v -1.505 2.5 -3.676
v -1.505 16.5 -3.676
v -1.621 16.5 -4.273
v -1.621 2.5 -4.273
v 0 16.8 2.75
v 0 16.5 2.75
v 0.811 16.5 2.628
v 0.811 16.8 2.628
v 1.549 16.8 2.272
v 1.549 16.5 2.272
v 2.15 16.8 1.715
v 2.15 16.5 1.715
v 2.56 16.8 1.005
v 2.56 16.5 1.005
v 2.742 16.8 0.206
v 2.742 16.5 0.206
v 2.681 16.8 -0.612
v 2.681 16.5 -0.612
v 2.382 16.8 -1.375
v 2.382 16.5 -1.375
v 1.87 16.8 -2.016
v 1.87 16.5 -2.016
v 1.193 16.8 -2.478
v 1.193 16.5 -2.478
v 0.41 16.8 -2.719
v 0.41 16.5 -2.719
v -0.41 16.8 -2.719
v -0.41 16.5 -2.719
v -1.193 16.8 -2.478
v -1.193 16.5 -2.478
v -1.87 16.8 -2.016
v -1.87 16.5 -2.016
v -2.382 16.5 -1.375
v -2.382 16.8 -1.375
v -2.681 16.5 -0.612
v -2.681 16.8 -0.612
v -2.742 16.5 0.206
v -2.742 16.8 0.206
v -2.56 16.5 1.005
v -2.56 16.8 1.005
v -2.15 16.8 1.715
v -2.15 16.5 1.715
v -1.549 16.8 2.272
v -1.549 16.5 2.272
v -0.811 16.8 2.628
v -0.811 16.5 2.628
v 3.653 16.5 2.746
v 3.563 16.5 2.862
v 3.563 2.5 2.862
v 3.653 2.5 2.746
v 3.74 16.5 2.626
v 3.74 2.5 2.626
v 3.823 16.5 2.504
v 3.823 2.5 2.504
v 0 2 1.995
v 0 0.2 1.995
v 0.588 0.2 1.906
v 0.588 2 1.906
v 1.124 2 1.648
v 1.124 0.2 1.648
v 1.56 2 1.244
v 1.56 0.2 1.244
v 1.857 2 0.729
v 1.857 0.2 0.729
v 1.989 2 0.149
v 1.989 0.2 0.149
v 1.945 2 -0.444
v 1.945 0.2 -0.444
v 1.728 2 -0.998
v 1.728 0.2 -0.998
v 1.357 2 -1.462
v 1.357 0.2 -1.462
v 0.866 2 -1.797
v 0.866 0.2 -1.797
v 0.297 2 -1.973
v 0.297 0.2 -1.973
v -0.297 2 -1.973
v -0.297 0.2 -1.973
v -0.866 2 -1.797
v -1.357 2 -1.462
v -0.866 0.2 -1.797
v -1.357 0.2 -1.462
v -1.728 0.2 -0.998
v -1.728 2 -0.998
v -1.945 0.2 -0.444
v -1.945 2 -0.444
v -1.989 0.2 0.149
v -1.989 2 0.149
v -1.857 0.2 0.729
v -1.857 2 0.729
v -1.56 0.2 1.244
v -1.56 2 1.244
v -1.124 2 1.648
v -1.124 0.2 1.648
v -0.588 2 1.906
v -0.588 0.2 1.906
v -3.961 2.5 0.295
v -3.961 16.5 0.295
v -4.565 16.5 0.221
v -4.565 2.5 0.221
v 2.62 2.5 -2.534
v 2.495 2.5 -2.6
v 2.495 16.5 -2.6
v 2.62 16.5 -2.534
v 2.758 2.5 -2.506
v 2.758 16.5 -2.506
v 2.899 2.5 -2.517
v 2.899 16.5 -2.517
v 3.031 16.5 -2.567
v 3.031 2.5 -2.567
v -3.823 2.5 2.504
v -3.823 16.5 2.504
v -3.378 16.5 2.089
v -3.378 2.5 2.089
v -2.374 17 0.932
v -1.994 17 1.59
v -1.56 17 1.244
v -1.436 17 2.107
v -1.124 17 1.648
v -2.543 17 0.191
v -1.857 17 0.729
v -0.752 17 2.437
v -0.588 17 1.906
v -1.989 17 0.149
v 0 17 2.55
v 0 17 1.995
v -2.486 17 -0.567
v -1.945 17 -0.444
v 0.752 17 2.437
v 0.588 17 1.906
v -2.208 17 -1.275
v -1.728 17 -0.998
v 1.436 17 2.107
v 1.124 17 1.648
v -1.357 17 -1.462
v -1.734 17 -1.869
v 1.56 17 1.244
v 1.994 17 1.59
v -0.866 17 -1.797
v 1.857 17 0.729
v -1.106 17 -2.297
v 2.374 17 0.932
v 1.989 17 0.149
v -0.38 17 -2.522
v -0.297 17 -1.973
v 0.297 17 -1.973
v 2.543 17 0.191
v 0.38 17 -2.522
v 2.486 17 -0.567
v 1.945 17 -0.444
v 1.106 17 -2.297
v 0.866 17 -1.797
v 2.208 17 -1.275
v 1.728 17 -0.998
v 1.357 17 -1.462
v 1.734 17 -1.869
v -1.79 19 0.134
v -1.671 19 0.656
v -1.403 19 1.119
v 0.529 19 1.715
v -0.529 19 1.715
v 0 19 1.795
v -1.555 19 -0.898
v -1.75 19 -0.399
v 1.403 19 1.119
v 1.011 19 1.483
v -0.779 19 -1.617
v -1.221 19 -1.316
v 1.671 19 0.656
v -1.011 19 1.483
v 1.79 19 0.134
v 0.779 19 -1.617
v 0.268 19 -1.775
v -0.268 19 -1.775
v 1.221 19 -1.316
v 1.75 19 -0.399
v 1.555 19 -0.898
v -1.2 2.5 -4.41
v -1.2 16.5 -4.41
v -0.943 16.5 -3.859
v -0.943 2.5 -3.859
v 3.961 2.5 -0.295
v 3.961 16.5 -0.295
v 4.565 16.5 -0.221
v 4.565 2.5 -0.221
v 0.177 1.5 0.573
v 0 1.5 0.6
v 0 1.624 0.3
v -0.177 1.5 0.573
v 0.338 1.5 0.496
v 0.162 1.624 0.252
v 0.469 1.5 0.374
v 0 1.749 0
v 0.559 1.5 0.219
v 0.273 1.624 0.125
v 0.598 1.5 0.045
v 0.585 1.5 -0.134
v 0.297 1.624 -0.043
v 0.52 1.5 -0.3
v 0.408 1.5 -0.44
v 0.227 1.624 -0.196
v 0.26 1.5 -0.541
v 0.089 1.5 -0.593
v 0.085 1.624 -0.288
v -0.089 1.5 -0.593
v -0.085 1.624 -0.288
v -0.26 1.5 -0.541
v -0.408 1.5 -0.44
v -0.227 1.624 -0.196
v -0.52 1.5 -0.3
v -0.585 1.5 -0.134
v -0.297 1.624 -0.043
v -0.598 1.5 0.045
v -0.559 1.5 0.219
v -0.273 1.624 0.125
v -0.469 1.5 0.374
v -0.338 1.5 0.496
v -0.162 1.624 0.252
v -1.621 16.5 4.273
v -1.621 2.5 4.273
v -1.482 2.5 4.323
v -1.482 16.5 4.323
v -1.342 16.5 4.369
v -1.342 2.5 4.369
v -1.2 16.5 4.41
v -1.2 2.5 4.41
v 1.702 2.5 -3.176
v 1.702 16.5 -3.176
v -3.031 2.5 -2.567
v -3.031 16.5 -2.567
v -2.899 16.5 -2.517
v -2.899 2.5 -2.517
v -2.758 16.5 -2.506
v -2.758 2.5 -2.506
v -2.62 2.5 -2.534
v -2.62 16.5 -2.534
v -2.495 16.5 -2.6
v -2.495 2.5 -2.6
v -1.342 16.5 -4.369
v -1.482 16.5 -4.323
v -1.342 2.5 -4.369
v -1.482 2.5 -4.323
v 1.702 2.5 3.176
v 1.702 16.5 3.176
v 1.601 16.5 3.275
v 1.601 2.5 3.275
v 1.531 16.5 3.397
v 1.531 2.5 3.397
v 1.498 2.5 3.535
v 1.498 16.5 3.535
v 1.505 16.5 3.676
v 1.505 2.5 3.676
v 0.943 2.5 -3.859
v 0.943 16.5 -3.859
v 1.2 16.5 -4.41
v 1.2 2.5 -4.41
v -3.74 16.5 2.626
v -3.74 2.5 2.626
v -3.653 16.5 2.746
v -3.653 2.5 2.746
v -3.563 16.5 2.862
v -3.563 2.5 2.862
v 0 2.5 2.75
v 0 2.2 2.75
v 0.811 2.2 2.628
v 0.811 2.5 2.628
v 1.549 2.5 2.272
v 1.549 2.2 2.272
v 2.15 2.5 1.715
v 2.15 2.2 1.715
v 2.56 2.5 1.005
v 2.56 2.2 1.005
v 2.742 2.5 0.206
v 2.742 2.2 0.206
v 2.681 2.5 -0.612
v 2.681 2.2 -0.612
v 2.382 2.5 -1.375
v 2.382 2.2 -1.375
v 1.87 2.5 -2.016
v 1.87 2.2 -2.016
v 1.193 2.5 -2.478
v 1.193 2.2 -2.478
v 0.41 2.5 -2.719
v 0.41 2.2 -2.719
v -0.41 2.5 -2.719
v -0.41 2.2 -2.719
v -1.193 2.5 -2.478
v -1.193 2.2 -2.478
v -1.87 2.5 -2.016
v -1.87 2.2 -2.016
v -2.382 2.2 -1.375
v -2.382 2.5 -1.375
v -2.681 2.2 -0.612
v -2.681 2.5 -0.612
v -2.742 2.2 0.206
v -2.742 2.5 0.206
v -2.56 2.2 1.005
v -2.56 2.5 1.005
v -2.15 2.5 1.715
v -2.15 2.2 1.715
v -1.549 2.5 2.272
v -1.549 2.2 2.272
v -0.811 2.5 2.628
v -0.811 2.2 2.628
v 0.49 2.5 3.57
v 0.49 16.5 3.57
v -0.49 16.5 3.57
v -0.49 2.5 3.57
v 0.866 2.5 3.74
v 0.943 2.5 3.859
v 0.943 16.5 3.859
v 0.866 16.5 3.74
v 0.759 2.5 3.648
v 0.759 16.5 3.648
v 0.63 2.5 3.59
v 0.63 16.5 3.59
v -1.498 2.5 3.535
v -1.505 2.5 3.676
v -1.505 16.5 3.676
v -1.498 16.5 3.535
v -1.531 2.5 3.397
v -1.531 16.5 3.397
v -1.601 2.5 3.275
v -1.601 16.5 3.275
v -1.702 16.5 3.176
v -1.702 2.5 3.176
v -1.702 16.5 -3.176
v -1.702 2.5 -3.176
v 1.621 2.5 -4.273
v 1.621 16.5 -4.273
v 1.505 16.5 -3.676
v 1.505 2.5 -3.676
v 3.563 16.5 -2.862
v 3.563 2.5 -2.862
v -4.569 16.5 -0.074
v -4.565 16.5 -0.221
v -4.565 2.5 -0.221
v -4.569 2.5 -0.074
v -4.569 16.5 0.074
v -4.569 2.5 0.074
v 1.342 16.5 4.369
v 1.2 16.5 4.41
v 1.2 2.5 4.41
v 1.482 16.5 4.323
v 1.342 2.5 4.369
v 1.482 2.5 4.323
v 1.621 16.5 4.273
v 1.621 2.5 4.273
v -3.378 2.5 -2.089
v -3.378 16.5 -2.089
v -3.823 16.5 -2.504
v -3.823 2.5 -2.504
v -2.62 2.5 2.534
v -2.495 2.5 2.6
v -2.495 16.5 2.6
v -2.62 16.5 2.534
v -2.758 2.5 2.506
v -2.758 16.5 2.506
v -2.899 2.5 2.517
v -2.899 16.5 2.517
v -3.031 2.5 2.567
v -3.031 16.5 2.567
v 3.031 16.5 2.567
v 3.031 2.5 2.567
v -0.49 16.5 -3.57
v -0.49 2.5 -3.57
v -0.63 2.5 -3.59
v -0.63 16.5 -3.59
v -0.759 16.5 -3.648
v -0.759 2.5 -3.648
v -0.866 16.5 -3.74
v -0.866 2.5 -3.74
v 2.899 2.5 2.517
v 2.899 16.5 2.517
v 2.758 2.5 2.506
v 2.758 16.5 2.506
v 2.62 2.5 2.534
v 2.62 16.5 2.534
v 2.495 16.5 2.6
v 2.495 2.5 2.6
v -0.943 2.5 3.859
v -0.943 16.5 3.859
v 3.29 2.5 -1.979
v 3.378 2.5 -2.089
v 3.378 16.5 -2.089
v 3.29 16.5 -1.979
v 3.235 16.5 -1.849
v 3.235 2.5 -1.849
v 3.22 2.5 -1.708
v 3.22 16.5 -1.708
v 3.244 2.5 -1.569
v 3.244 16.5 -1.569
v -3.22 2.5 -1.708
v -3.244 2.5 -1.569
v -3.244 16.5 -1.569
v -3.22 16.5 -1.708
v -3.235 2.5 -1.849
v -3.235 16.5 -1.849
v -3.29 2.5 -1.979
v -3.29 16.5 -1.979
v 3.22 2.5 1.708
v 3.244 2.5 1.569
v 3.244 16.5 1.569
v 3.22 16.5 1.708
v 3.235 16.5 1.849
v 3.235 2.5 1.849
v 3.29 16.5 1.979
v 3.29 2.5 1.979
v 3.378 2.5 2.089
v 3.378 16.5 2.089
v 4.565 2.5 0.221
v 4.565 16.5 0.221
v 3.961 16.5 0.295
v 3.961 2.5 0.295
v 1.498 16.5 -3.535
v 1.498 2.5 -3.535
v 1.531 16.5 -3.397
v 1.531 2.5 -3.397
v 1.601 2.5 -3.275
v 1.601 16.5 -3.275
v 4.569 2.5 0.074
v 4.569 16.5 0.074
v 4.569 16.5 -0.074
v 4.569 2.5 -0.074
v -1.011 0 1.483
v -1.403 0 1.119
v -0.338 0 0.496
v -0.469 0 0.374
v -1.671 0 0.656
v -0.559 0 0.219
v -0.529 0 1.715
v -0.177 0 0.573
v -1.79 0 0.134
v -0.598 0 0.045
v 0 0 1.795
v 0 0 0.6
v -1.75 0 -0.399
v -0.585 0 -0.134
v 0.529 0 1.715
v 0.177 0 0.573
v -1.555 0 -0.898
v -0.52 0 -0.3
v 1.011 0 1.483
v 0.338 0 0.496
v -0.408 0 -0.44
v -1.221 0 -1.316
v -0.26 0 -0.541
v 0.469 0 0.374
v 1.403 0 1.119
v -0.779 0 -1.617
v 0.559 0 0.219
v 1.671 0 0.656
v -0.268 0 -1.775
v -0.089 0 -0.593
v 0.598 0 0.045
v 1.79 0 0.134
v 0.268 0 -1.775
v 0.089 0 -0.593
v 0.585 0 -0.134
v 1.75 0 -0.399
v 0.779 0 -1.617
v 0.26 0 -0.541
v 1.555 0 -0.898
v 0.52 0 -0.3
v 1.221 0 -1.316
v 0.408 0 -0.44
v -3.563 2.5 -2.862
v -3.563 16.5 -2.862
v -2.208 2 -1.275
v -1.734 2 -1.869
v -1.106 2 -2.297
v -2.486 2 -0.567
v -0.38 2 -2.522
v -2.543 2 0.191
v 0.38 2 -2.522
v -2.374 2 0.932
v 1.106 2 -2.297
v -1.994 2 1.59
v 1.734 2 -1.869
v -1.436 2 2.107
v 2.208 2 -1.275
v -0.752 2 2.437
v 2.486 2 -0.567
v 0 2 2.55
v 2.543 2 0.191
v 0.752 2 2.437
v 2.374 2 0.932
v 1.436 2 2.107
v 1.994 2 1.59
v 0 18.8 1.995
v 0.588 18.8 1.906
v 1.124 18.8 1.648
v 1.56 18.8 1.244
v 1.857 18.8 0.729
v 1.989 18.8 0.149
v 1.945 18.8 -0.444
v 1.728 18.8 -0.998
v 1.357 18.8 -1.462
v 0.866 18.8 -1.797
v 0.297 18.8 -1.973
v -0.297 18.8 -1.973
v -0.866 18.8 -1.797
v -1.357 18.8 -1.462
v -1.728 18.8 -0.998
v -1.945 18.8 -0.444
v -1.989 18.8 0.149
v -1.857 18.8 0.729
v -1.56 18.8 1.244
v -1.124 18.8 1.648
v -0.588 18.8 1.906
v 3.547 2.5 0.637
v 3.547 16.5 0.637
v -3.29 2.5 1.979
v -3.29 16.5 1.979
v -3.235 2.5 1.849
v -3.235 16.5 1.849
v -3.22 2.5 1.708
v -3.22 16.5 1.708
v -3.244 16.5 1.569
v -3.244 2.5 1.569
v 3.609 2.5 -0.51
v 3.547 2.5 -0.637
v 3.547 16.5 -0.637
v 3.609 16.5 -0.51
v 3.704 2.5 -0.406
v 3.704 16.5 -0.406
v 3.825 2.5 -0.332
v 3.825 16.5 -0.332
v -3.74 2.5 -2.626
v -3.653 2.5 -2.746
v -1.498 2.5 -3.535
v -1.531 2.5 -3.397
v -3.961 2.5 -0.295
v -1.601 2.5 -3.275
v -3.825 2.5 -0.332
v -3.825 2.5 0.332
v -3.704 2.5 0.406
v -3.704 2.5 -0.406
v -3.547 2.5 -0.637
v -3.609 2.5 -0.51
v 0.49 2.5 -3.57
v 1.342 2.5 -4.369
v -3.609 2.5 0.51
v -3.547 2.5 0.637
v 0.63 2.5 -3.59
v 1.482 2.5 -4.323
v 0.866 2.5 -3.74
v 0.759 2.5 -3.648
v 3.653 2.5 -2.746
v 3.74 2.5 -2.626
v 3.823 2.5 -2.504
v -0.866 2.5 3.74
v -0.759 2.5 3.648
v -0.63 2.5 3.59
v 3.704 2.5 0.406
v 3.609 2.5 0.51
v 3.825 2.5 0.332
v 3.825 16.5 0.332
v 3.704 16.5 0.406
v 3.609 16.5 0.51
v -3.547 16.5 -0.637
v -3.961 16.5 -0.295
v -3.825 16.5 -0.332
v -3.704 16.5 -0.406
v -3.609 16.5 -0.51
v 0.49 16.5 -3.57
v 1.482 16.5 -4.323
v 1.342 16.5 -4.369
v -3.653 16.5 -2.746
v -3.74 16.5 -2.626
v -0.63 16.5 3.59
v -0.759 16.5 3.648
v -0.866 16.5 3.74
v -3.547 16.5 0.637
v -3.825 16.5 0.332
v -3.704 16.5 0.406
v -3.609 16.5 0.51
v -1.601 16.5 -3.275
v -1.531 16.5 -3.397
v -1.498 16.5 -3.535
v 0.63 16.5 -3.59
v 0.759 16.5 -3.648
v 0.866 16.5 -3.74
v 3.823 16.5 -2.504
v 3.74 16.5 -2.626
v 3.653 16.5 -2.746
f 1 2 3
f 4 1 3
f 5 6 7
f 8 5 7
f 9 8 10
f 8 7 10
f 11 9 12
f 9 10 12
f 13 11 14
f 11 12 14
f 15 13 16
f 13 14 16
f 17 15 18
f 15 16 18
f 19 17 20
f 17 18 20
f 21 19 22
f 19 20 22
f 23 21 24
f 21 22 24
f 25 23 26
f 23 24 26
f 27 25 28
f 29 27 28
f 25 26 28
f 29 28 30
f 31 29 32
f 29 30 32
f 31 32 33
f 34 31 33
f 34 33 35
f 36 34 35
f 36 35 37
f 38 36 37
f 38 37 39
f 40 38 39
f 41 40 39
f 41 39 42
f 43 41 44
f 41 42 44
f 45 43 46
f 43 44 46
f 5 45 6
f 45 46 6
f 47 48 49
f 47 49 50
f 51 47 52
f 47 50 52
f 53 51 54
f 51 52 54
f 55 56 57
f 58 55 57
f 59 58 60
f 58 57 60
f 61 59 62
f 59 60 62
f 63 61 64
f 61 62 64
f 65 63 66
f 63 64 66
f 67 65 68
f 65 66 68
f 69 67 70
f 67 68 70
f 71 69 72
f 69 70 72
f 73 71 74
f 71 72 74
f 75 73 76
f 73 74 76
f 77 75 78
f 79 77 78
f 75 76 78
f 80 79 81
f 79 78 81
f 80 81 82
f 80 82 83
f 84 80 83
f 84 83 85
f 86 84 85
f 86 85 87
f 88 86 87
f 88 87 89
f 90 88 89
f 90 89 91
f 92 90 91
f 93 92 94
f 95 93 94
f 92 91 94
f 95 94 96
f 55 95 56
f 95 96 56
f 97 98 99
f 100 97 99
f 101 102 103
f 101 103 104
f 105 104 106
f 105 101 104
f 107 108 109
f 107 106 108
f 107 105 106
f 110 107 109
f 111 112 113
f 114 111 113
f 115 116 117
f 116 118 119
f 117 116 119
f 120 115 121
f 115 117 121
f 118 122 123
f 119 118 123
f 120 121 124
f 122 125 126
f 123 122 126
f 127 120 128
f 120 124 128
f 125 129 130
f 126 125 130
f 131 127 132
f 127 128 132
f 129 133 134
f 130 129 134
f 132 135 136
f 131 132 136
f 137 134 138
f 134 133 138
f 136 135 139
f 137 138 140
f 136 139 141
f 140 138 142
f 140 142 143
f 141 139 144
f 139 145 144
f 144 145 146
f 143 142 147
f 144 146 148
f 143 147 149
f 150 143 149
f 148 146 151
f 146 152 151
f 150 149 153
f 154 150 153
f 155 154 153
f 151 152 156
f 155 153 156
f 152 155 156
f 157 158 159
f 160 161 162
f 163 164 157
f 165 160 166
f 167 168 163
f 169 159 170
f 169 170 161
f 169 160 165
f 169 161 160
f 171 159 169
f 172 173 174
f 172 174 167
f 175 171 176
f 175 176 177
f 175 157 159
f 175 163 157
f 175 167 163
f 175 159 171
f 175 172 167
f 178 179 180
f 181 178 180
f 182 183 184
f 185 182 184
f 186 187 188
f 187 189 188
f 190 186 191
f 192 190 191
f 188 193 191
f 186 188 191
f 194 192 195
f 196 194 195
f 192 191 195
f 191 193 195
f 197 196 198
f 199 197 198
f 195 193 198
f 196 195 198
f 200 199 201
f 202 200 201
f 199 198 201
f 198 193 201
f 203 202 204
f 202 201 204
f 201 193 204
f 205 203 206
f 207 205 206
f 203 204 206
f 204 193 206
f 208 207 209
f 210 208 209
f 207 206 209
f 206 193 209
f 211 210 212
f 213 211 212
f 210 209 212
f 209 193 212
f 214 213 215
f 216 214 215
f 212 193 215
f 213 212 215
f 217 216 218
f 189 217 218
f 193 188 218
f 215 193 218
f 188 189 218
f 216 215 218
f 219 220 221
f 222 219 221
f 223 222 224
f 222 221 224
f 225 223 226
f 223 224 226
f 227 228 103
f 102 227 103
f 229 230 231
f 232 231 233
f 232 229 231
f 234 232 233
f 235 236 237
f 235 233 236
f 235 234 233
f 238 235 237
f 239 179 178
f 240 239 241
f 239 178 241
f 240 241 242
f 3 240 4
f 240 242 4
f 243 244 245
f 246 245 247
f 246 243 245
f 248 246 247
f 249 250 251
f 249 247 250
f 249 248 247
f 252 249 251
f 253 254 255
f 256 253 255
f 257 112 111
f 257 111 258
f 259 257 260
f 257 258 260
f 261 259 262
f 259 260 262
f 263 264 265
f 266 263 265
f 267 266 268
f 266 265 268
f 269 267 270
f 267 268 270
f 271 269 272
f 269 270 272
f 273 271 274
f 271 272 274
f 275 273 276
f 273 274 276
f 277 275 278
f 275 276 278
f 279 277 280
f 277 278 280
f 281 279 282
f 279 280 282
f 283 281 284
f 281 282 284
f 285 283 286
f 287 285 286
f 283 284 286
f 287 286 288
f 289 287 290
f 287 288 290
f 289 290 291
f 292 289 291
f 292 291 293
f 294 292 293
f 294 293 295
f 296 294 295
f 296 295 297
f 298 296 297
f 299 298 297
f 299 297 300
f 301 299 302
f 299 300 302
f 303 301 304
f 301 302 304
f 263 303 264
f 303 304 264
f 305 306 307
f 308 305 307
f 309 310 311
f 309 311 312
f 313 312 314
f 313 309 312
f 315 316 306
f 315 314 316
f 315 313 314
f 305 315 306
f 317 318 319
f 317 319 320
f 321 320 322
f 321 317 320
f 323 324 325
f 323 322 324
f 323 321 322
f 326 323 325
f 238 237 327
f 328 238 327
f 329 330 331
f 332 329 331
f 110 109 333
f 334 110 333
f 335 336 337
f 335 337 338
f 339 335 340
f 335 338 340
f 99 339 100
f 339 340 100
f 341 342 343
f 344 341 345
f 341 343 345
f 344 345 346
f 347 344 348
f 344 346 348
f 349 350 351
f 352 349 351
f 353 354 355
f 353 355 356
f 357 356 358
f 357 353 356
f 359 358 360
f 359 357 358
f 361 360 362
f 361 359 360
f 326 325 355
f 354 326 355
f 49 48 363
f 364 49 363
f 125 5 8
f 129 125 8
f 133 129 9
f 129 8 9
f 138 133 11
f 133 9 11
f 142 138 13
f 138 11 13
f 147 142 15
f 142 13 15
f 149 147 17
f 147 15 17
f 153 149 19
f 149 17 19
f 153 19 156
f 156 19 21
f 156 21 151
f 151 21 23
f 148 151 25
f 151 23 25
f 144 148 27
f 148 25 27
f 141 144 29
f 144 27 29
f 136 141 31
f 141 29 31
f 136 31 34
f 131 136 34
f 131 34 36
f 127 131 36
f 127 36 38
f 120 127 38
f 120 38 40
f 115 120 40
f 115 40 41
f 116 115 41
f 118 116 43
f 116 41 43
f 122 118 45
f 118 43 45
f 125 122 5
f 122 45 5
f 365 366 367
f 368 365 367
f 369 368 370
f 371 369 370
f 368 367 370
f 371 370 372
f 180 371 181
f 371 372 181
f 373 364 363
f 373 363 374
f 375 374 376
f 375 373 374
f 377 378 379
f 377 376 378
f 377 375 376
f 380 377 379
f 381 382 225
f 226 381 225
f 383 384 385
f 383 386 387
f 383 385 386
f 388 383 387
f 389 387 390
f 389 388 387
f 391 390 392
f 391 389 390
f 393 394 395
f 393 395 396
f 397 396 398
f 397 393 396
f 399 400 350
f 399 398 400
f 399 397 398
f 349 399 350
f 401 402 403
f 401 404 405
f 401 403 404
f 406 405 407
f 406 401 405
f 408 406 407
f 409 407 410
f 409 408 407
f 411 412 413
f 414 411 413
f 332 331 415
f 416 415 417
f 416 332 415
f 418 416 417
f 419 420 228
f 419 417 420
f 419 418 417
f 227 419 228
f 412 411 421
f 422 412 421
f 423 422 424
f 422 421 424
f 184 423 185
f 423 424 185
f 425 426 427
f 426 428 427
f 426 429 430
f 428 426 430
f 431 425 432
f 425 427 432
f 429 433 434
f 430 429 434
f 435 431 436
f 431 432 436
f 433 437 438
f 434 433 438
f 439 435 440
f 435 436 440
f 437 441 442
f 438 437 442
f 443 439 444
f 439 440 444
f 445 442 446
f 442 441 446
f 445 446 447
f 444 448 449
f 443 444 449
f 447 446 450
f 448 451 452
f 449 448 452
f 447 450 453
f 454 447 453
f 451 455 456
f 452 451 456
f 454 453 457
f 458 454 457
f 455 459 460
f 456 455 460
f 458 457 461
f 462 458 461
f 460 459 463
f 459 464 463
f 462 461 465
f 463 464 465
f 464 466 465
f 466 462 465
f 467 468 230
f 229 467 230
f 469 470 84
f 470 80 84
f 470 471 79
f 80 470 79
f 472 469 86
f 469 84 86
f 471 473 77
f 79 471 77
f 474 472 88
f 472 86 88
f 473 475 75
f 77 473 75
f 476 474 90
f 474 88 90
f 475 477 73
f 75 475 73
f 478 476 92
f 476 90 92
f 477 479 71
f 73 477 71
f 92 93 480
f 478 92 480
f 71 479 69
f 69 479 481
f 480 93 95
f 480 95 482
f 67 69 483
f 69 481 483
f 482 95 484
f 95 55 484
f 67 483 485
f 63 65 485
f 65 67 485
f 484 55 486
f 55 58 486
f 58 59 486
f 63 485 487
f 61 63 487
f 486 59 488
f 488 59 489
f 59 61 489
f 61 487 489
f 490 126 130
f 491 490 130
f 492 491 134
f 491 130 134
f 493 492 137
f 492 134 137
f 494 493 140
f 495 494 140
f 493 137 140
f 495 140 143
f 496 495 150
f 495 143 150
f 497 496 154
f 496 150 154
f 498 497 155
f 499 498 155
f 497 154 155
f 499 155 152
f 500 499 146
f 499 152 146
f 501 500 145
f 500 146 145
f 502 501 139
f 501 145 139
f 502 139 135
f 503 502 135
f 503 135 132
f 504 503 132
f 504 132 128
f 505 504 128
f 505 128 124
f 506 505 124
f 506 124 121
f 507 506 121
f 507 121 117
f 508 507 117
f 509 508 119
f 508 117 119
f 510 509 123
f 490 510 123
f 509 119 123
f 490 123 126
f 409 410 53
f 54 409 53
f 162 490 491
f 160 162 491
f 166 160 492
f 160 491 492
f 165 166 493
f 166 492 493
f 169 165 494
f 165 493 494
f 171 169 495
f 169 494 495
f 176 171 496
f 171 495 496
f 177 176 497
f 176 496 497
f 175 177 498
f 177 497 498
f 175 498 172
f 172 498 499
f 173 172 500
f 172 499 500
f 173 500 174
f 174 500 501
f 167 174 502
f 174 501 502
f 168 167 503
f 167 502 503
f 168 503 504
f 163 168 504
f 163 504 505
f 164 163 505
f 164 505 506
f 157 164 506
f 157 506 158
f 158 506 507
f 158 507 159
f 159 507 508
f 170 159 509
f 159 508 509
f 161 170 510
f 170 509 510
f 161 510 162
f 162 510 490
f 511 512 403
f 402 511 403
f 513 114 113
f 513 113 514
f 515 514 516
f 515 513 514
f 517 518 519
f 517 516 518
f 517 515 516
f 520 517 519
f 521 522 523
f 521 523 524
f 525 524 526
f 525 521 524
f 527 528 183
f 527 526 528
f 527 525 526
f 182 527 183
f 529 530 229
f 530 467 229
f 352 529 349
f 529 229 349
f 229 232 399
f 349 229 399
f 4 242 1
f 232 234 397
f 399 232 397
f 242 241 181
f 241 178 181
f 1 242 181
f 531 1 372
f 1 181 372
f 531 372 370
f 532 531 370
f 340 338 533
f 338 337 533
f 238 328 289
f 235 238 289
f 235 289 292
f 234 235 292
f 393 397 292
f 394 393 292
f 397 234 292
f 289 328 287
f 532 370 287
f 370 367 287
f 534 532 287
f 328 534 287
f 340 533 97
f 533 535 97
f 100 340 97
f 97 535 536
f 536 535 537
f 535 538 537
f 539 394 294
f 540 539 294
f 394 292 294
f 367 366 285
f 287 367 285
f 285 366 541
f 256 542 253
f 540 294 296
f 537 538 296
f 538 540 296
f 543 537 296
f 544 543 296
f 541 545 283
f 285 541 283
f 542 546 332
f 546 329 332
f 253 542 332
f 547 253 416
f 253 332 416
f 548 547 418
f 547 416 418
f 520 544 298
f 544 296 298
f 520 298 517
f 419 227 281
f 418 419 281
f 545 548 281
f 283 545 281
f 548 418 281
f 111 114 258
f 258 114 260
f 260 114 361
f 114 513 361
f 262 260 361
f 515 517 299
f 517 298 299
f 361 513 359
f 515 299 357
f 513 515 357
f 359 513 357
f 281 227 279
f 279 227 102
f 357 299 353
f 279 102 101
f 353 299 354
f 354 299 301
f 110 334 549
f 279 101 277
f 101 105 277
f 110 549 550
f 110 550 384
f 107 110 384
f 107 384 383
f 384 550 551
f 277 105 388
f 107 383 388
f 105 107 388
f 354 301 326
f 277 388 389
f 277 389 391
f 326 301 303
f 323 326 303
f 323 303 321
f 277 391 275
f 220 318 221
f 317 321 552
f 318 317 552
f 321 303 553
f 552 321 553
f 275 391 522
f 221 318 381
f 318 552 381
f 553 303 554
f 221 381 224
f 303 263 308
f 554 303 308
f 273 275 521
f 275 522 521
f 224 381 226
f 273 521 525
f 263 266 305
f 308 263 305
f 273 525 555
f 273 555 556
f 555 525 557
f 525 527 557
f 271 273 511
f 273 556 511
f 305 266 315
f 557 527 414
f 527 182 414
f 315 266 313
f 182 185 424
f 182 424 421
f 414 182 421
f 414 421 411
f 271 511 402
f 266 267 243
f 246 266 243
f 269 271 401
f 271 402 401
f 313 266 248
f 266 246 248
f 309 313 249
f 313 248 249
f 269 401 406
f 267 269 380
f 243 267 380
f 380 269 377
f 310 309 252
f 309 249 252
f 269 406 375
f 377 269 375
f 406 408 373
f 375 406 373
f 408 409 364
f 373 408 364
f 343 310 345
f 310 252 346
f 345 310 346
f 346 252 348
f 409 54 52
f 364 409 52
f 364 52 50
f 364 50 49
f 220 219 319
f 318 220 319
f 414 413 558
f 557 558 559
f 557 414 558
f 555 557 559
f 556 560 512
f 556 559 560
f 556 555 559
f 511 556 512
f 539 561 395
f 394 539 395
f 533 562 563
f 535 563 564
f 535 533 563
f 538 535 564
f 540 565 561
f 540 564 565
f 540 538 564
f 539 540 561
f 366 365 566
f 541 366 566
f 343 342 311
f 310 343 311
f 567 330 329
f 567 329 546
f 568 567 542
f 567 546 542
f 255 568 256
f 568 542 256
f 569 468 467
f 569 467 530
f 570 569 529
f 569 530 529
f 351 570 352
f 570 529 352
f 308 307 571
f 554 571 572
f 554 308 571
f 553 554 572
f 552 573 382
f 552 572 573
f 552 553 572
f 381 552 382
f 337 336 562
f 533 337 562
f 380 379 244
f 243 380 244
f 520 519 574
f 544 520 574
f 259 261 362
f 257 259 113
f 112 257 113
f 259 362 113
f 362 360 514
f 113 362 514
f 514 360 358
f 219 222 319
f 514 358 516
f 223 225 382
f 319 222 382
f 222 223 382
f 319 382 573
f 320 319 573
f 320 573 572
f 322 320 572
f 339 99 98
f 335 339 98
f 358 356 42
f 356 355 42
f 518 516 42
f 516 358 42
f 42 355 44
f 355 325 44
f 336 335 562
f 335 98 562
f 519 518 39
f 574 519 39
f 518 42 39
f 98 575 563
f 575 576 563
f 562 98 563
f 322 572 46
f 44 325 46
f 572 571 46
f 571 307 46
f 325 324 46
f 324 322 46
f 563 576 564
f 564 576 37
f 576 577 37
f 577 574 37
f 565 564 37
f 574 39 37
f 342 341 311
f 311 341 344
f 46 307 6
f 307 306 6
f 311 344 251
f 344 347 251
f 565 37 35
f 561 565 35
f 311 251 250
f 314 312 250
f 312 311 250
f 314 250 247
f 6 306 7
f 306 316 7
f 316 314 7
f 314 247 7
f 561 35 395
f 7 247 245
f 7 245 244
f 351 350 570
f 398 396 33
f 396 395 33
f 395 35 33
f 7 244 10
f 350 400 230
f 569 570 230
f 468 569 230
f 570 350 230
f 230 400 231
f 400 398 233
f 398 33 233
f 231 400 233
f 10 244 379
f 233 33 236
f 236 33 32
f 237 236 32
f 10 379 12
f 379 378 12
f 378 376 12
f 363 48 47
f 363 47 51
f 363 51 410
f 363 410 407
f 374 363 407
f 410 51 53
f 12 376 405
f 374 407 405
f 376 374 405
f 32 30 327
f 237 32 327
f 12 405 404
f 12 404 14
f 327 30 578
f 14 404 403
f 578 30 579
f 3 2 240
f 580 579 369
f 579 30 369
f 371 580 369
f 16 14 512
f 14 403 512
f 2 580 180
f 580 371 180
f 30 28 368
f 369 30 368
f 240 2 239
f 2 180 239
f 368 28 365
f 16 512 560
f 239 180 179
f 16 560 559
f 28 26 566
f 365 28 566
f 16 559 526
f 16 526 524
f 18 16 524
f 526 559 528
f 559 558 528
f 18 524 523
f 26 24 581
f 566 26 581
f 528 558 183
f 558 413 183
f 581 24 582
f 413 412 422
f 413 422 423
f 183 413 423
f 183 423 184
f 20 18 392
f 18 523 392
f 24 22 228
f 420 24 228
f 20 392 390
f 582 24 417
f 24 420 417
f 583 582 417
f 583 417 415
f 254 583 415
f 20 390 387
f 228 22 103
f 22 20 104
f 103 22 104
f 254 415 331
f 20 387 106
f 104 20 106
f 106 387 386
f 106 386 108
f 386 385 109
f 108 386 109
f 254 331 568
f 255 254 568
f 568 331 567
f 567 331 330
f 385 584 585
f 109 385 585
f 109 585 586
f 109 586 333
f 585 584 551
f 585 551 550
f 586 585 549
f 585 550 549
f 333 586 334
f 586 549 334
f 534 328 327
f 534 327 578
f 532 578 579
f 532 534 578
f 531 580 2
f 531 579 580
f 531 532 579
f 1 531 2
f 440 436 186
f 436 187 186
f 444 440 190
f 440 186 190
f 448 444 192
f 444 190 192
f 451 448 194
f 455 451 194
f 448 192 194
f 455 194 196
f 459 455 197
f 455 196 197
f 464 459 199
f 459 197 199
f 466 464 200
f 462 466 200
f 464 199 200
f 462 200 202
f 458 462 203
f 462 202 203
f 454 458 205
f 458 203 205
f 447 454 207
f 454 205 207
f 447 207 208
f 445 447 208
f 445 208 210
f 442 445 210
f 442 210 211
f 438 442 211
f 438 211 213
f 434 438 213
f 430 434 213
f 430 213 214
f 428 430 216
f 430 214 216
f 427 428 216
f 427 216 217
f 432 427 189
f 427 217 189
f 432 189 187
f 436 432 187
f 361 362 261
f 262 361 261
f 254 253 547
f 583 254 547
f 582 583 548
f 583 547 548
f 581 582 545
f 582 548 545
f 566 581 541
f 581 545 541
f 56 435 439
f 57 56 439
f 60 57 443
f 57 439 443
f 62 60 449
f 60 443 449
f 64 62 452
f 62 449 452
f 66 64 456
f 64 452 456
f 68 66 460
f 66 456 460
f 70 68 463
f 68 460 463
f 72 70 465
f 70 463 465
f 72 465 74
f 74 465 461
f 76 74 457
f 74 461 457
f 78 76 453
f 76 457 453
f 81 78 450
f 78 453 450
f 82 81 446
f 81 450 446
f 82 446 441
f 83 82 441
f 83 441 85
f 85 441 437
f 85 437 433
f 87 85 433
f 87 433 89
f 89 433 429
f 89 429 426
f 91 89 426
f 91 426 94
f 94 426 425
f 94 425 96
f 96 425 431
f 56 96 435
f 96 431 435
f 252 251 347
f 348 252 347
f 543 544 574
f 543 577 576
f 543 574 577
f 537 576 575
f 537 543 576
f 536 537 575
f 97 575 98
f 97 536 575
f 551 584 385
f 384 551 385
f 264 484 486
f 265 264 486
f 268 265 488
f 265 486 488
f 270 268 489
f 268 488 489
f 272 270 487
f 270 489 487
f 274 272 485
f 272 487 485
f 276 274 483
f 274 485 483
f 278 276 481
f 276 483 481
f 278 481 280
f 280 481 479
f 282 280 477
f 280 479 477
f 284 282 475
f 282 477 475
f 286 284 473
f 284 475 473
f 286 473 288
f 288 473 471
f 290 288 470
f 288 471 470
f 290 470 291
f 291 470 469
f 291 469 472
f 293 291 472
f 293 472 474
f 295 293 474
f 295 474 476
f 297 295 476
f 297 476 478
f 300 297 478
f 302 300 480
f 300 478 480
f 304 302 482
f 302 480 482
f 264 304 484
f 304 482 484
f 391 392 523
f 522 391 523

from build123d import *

# Parameters (mm, degrees)
SKIZZE1_R                       = 4.57
AUFSATZ_LINEAR_AUSTRAGEN1_DEPTH = 19
SCHNITT_LINEAR_AUSTRAGEN1_DEPTH = 21.069125541
VERRUNDUNG1_R                   = 0.5
KREISMUSTER1_COUNT              = 10
VERRUNDUNG1_OF_KREISMUSTER1_R   = 0.5
FASE1_SIZE                      = 0.2


with BuildPart() as part:
    # Skizze1 → Aufsatz-Linear austragen1 (new body)
    with BuildSketch(Plane(origin=(0, 0, 0), x_dir=(1, 0, 0), z_dir=(0, 1, 0))):
        Circle(SKIZZE1_R)
    extrude(amount=AUFSATZ_LINEAR_AUSTRAGEN1_DEPTH)

    # Skizze12 → Schnitt-Linear austragen1 (cut, through all)
    with BuildSketch(Plane(origin=(0, 19, 0), x_dir=(1, 0, 0), z_dir=(0, 1, 0))):
        with BuildLine():
            Line((-1.2, 4.409637173), (-0.808470756, 3.57))
            Line((-0.808470756, 3.57), (0.808470756, 3.57))
            Line((0.808470756, 3.57), (1.2, 4.409637173))
            ThreePointArc((1.2, 4.409637173), (0, 4.57), (-1.2, 4.409637173))
        make_face()
    schnitt_linear_austragen1 = extrude(amount=-SCHNITT_LINEAR_AUSTRAGEN1_DEPTH, mode=Mode.SUBTRACT)

    # Verrundung1
    verrundung1_edges = [part.edges().sort_by_distance(p)[0] for p in [
        (-0.808470756, 9.5, -3.57),
        (0.808470756, 9.5, -3.57),
    ]]
    fillet(verrundung1_edges, radius=VERRUNDUNG1_R)

    # Kreismuster1: Schnitt-Linear austragen1 ×10 about axis
    kreismuster1_axis = Axis((0, -1.826859831, 0), (0, 1, 0))
    for i in range(1, KREISMUSTER1_COUNT):
        add(schnitt_linear_austragen1.rotate(kreismuster1_axis, i * 360 / KREISMUSTER1_COUNT), mode=Mode.SUBTRACT)

    # Verrundung1 of Kreismuster1
    verrundung1_of_kreismuster1_edges = [part.edges().sort_by_distance(p)[0] for p in [
        (-2.752459932, 9.5, -2.412983483),
        (-1.44432677, 9.5, -3.363397857),
        (-3.645102966, 9.5, -0.334289289),
        (-3.14544056, 9.5, -1.872092051),
        (-3.14544056, 9.5, 1.872092051),
        (-3.645102966, 9.5, 0.334289289),
        (-1.44432677, 9.5, 3.363397857),
        (-2.752459932, 9.5, 2.412983483),
        (0.808470756, 9.5, 3.57),
        (-0.808470756, 9.5, 3.57),
        (2.752459932, 9.5, 2.412983483),
        (1.44432677, 9.5, 3.363397857),
        (3.645102966, 9.5, 0.334289289),
        (3.14544056, 9.5, 1.872092051),
        (3.14544056, 9.5, -1.872092051),
        (3.645102966, 9.5, -0.334289289),
        (1.44432677, 9.5, -3.363397857),
        (2.752459932, 9.5, -2.412983483),
    ]]
    fillet(verrundung1_of_kreismuster1_edges, radius=VERRUNDUNG1_OF_KREISMUSTER1_R)

    # Skizze13 → Schnitt-Rotation1 (revolve, cut)
    with BuildSketch(Plane(origin=(0, 0, 0), x_dir=(0, 0, -1), z_dir=(1, 0, 0))):
        Polygon((-1.995, 0), (-10.076763041, 0), (-10.076763041, 19), (-1.995, 19), (-1.995, 17), (-2.75, 17), (-2.75, 16.5), (-6.450923694, 16.5), (-6.450923694, 2.5), (-2.75, 2.5), (-2.75, 2), (-1.995, 2), align=None)
    revolve(axis=Axis((0, -5.607699778, 0), (0, 1, 0)), mode=Mode.SUBTRACT)

    # Fase1
    fase1_edges = [part.edges().sort_by_distance(p)[0] for p in [
        (0, 0, -1.995),
        (0, 2, -2.75),
        (0, 17, -2.75),
        (0, 19, -1.995),
    ]]
    chamfer(fase1_edges, length=FASE1_SIZE)

    # Skizze14 → Schnitt-Rotation2 (revolve, cut)
    with BuildSketch(Plane(origin=(0, 0, 0), x_dir=(0, 0, -1), z_dir=(1, 0, 0))):
        Polygon((0, 0), (-0.6, 0), (-0.6, 1.5), (0, 1.748528137), align=None)
    revolve(axis=Axis((0, -2.816169131, 0), (0, 1, 0)), mode=Mode.SUBTRACT)


solid = part.part
